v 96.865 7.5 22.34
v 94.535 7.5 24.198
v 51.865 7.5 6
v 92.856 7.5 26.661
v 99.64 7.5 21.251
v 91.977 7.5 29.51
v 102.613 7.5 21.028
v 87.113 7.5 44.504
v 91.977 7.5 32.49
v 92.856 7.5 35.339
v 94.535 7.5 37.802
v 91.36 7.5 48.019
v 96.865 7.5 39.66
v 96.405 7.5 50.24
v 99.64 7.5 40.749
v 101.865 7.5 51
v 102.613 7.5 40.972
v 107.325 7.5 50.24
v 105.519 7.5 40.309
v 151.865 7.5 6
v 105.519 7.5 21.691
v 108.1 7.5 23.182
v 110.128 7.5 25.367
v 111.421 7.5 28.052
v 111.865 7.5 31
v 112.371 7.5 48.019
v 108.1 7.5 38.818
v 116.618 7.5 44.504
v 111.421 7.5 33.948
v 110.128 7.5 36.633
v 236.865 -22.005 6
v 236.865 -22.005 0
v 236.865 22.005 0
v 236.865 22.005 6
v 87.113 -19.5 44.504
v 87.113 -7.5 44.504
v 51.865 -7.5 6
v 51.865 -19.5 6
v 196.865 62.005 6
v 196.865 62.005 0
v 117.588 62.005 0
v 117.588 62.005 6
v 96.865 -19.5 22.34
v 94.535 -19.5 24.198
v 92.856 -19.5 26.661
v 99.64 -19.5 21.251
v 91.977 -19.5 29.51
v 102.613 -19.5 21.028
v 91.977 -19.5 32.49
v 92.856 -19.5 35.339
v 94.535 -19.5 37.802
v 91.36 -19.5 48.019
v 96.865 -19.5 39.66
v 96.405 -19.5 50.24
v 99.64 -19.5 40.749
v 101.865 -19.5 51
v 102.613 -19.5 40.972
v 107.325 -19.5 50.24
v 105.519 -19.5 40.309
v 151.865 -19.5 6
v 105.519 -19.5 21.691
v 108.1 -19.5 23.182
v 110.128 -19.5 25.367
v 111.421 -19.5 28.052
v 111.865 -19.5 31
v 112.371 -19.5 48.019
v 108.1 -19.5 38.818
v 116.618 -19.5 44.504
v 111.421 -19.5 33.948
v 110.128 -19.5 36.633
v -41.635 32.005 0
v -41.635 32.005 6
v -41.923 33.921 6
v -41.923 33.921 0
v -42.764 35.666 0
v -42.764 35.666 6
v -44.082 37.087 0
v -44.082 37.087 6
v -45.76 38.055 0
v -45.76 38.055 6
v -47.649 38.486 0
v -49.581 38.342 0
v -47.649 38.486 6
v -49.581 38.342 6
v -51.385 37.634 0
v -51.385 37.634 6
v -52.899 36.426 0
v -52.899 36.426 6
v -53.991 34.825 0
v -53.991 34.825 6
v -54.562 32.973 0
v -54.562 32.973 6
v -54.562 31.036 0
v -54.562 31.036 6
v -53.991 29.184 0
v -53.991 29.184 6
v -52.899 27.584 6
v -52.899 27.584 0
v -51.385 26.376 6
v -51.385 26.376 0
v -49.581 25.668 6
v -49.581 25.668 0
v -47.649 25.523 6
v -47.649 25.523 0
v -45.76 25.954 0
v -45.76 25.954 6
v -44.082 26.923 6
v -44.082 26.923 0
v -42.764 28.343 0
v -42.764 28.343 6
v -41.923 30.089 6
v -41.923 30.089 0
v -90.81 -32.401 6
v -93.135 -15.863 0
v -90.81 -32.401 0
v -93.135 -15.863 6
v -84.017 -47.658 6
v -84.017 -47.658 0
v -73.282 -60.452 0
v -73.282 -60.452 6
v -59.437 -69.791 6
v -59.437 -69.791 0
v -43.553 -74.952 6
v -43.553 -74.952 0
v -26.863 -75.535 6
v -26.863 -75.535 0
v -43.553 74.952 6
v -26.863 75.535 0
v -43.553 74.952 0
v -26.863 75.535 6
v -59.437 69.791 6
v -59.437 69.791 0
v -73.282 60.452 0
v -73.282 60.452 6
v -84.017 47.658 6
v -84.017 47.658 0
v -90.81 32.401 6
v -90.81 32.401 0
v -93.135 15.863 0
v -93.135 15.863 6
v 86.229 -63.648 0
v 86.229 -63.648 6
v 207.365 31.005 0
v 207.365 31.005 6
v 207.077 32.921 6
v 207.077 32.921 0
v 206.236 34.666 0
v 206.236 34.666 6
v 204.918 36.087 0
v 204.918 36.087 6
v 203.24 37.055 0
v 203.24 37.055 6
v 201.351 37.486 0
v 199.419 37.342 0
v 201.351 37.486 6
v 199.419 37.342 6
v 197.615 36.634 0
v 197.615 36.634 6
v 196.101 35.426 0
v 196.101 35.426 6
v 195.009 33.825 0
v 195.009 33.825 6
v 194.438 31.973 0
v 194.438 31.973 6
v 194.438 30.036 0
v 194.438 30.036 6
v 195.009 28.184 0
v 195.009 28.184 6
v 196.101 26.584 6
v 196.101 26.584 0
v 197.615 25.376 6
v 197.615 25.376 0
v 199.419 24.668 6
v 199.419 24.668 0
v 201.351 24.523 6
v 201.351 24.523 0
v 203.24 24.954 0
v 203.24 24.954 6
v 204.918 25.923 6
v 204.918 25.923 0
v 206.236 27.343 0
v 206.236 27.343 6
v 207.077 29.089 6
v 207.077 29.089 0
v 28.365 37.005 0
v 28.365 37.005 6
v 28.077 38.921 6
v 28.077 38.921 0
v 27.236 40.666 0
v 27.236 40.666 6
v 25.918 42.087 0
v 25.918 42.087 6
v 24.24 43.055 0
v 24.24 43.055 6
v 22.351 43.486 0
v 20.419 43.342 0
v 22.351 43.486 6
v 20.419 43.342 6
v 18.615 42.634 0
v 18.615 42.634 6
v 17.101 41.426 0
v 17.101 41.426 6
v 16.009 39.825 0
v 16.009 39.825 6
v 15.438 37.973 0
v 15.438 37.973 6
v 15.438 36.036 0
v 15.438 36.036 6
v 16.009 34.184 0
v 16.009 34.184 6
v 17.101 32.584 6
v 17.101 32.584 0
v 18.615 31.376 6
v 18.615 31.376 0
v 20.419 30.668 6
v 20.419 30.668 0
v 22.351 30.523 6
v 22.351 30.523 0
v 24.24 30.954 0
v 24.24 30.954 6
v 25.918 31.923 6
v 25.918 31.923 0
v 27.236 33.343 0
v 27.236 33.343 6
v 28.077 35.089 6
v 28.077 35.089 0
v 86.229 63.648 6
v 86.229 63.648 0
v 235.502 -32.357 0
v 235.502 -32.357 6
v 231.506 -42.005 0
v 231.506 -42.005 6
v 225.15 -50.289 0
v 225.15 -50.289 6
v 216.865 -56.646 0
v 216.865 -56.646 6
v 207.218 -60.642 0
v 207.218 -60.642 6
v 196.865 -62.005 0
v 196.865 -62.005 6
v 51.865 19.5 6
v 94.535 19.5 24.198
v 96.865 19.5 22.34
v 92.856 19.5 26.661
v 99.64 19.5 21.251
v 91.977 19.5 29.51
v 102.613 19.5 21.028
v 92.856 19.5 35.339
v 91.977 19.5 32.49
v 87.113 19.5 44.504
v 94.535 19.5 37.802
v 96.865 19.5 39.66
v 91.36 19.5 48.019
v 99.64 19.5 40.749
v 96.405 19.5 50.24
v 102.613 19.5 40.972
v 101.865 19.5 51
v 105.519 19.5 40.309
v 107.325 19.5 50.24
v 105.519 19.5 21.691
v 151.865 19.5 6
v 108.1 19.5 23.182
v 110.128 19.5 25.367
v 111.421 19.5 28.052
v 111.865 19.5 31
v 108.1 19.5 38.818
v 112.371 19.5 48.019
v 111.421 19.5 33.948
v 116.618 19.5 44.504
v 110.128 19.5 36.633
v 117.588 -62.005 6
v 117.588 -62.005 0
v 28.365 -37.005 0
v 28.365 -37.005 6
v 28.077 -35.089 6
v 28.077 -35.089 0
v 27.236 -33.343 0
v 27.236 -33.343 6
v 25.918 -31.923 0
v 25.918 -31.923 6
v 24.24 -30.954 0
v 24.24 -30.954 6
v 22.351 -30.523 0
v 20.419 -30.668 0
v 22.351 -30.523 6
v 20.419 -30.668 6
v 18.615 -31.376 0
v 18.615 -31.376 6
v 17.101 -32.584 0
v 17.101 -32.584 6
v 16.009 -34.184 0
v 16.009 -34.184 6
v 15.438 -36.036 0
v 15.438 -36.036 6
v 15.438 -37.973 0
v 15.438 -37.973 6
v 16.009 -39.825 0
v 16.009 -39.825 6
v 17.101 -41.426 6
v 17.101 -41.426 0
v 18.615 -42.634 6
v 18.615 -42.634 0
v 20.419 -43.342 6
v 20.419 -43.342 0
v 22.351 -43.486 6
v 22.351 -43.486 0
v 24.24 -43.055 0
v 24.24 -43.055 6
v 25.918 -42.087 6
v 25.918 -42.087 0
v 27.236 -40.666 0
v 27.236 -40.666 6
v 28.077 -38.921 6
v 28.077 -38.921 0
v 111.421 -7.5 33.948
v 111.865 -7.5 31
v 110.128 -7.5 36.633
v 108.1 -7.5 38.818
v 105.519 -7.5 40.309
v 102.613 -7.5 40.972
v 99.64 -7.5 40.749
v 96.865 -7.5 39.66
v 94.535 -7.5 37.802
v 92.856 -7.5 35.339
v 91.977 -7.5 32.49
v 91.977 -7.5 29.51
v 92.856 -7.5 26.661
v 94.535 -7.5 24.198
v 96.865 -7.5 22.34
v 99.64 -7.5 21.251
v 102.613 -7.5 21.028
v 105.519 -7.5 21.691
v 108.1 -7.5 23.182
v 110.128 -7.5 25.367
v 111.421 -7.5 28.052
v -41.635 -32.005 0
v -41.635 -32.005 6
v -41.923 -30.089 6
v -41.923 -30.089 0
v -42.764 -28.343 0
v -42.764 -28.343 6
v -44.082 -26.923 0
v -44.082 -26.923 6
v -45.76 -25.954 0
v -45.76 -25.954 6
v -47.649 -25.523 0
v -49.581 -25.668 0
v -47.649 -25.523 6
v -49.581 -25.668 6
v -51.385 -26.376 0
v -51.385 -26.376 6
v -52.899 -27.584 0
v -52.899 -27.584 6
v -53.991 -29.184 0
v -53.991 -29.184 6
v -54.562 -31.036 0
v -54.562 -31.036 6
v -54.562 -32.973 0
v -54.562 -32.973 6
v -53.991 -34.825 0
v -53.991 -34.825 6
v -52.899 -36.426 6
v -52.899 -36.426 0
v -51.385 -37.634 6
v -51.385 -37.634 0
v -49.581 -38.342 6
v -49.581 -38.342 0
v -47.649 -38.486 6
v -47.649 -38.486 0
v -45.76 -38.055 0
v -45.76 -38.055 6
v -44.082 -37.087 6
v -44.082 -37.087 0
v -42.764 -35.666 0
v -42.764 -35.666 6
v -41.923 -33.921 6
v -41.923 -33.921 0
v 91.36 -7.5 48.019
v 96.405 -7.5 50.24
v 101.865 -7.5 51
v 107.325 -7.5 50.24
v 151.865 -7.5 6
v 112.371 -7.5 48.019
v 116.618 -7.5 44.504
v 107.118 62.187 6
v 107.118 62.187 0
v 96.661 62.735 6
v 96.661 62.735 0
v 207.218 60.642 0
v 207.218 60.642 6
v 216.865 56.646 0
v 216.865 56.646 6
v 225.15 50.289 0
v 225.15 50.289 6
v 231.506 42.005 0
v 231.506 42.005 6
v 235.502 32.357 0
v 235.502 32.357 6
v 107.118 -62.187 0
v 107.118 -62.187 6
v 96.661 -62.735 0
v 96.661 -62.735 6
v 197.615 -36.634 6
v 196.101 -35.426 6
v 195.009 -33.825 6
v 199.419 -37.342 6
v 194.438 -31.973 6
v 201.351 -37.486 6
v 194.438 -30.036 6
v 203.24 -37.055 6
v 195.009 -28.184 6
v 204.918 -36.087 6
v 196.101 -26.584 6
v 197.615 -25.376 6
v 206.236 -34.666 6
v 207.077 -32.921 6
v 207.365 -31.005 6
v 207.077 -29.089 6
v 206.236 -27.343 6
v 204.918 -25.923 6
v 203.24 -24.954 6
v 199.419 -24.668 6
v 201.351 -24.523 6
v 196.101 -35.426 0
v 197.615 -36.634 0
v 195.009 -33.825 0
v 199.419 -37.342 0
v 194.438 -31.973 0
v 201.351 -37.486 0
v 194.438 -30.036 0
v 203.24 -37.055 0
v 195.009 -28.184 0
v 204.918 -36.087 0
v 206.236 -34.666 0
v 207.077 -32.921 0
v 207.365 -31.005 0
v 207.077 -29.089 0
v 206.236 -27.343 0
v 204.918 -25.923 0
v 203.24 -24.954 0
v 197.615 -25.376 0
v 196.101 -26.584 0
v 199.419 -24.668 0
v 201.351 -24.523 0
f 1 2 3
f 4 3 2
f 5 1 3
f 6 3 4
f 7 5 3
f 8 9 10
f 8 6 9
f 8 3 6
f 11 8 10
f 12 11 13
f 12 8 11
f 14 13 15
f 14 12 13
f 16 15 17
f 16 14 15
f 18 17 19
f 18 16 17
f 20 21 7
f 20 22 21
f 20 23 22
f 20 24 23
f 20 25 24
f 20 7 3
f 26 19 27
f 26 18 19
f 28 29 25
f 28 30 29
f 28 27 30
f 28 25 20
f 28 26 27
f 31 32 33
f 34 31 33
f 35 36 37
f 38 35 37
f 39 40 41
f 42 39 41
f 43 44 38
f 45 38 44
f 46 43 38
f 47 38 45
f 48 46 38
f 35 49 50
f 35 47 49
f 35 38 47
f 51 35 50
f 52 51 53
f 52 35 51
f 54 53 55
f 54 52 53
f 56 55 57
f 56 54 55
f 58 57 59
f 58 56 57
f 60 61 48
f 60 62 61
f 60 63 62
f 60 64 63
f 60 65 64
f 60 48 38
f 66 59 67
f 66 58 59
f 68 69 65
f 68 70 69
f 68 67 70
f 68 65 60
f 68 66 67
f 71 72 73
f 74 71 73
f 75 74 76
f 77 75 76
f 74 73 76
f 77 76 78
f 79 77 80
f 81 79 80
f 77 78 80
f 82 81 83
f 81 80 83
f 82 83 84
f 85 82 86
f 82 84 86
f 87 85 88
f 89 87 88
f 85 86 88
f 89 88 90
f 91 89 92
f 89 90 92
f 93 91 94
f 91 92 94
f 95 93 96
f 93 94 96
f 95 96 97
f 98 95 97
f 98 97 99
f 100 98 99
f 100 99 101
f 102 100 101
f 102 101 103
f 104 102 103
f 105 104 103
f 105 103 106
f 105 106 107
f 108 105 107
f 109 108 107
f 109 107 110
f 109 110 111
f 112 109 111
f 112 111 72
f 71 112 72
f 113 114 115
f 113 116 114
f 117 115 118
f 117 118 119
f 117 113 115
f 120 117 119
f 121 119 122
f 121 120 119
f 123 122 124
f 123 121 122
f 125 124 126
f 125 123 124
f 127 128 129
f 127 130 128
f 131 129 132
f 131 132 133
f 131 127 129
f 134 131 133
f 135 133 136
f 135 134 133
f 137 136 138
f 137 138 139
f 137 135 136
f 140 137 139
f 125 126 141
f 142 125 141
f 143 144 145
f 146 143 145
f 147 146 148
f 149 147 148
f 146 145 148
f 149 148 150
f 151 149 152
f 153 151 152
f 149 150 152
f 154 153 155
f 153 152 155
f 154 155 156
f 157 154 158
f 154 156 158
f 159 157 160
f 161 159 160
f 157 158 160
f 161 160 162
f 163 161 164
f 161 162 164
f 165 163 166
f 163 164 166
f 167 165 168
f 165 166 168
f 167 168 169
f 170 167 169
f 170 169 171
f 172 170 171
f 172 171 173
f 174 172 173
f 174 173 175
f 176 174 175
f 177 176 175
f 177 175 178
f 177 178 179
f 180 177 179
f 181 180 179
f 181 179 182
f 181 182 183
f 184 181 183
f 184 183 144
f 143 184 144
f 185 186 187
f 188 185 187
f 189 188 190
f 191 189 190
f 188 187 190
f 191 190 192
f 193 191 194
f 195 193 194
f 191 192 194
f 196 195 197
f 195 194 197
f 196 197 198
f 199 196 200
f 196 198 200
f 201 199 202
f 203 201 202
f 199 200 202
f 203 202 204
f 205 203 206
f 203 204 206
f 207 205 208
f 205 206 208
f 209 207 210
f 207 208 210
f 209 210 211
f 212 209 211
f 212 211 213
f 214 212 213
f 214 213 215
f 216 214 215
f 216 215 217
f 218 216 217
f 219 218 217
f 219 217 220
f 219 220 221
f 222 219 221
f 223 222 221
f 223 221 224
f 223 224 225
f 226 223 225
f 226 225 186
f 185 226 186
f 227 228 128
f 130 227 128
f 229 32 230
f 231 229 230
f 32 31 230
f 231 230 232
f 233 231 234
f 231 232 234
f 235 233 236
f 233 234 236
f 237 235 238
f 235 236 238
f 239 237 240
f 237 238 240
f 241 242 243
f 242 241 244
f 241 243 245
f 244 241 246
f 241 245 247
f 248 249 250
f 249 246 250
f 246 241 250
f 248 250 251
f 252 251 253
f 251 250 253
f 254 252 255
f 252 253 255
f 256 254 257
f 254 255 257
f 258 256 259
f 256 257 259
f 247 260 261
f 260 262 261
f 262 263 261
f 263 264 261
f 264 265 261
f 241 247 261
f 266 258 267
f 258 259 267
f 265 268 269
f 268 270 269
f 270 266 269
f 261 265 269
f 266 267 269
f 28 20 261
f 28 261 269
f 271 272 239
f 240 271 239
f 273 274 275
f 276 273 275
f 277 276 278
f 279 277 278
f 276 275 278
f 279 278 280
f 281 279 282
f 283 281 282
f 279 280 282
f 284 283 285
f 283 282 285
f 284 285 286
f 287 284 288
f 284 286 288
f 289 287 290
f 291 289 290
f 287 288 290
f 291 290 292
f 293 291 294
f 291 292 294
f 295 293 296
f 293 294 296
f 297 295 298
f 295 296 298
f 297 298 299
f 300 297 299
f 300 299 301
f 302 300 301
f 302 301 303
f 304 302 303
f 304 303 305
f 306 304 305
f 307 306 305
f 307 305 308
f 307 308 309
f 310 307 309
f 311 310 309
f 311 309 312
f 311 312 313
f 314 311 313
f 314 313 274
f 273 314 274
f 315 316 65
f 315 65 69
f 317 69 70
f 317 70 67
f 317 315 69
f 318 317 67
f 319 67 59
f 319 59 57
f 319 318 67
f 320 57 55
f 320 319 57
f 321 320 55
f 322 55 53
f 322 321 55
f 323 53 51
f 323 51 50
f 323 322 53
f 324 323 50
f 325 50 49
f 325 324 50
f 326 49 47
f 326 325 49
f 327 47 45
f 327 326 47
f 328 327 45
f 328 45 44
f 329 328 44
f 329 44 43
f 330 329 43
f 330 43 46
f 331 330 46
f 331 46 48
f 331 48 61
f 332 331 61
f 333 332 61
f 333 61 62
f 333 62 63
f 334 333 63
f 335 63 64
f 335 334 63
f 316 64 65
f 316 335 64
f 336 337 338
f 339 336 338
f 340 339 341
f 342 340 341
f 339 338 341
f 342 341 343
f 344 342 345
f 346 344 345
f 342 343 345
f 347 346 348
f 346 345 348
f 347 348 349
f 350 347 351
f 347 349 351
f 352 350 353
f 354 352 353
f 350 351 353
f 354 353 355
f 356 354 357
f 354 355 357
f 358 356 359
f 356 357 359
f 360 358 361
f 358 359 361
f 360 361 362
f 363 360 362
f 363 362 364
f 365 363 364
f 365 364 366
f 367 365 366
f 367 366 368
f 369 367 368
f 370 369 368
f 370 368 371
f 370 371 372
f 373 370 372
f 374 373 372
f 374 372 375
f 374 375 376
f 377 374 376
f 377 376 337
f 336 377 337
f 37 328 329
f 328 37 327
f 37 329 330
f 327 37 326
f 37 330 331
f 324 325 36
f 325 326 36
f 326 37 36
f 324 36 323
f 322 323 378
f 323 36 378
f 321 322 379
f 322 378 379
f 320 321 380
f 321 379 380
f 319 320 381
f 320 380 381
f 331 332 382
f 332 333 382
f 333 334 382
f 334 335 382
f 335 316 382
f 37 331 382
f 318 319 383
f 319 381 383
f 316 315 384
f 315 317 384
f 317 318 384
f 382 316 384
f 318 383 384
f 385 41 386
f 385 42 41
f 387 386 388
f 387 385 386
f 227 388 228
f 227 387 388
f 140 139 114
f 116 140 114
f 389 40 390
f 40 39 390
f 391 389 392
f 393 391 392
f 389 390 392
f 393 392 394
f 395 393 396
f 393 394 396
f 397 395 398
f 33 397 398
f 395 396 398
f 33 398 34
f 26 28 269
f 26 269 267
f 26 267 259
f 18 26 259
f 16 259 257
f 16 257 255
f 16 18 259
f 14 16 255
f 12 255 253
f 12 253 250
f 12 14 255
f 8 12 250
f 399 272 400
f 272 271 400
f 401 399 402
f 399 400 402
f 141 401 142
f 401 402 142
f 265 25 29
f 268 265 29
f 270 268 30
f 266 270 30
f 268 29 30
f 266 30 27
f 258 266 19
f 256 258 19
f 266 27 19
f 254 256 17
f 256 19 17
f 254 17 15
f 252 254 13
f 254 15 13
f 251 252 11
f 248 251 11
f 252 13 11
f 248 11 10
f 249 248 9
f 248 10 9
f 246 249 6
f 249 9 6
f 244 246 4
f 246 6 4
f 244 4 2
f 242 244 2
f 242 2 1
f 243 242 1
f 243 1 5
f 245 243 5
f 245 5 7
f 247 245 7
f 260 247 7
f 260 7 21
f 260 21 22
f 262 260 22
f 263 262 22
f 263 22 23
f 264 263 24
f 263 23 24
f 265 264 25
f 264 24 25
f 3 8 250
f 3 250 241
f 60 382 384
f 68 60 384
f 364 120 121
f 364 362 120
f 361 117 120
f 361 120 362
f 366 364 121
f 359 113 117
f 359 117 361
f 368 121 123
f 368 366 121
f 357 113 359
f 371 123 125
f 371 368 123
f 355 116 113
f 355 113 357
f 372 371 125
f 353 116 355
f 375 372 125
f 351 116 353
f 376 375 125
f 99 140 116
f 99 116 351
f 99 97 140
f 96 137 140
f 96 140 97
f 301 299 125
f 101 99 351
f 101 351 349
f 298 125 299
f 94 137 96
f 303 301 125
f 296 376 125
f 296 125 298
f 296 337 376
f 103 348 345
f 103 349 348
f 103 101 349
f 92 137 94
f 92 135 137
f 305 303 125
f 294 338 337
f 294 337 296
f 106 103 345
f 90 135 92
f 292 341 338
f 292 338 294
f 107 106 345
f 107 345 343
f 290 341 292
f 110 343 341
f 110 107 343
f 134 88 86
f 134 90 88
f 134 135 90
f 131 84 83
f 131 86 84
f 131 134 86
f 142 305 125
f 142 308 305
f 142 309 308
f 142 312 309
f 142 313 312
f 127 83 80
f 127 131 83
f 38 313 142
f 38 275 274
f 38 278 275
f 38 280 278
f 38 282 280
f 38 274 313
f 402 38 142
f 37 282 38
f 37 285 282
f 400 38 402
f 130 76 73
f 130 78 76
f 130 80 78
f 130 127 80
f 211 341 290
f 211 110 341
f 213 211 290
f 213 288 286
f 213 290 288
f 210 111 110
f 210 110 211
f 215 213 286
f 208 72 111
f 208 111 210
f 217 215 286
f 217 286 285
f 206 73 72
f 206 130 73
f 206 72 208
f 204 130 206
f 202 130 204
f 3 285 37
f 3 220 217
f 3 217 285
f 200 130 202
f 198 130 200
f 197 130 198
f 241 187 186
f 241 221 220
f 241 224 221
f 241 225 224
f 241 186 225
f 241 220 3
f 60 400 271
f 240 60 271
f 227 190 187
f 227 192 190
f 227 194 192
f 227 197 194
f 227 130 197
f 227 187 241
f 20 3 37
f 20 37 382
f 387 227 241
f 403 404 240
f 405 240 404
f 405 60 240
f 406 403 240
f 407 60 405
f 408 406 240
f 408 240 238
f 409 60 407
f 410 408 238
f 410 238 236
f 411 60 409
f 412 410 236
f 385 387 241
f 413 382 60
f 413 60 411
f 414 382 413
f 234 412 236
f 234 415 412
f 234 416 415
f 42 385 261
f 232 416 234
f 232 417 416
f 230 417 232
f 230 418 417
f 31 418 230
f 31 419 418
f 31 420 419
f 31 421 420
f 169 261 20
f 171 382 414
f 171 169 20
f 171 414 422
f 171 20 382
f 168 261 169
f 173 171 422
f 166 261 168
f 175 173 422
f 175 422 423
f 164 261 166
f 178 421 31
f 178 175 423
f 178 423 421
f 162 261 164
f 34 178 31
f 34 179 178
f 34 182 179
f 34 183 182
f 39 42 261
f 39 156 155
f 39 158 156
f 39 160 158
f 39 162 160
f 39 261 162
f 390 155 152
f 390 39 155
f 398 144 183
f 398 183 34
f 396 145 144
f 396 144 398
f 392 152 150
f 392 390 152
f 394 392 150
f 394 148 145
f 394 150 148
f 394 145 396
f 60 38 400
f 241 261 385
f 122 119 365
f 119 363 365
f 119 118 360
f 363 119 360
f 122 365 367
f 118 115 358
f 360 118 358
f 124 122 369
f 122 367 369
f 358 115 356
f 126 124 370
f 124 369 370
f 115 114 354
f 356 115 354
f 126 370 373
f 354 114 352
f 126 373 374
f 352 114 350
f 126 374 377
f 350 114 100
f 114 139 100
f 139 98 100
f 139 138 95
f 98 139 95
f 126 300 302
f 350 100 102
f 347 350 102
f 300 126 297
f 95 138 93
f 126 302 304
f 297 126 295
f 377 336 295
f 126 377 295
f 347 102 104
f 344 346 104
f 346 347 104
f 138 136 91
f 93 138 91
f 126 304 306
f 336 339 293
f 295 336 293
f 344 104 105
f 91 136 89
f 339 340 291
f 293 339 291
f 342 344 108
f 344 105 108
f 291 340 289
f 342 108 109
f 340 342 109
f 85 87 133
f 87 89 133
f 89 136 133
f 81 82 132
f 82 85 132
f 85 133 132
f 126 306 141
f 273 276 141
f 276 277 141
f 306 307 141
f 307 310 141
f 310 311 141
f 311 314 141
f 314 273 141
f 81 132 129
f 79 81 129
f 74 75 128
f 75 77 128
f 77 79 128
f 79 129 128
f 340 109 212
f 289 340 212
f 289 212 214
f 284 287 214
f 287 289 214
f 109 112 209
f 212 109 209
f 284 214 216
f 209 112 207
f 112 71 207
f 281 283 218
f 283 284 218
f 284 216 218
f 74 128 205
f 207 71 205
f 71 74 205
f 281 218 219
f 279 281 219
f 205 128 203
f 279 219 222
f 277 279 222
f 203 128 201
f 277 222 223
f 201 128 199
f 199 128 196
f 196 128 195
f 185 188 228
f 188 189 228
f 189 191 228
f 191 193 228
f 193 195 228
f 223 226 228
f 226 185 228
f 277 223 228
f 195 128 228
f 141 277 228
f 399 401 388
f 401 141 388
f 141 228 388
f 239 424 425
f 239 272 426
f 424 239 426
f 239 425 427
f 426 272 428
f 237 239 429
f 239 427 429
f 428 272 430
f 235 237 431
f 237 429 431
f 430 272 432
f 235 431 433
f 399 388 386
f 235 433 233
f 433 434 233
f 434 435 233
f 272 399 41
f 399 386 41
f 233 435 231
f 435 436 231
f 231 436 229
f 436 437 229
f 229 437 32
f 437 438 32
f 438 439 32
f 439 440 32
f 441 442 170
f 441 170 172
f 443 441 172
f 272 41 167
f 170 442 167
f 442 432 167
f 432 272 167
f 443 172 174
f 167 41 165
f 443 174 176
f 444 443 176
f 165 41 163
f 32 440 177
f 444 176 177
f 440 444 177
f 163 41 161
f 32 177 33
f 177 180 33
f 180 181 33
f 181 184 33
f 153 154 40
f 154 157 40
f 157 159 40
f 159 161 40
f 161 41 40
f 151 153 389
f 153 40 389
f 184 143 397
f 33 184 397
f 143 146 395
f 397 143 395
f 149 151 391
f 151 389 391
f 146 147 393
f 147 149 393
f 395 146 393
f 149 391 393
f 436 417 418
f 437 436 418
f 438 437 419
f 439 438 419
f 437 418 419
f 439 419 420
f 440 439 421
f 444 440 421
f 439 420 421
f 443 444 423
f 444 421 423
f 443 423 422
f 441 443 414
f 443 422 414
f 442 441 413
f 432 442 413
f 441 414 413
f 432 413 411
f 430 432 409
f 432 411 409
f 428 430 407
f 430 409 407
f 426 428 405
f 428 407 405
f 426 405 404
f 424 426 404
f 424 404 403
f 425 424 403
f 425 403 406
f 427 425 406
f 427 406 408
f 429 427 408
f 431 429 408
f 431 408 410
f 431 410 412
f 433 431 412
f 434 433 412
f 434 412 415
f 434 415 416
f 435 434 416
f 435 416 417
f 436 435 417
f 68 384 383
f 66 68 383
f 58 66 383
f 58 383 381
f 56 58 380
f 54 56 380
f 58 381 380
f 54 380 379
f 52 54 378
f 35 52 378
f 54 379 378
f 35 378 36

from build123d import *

# Parameters (mm, degrees)
F1_DEPTH  = 6
F2_R      = 60
F3_R      = 40
F4_R      = 300
F8_R      = 10
F10_DEPTH = 12
F9_R      = 10
F11_DEPTH = 12
F12_R     = 6.5
F13_DEPTH = 25


with BuildPart() as f1:
    # F0 (on Top) → F1 (new body)
    with BuildSketch(Plane.XY):
        Polygon((101.865418, 62.004674), (-93.134582, 82.5), (-93.134582, -82.5), (101.865418, -62.004674), (236.865418, -62.004674), (236.865418, 62.004674), align=None)
    extrude(amount=F1_DEPTH)

    # F2
    f2_edges = [f1.edges().sort_by_distance(p)[0] for p in [
        (-93.134582, -82.5, 3),
        (-93.134582, 82.5, 3),
    ]]
    fillet(f2_edges, radius=F2_R)

    # F3
    f3_edges = [f1.edges().sort_by_distance(p)[0] for p in [
        (236.865418, -62.004674, 3),
        (236.865418, 62.004674, 3),
    ]]
    fillet(f3_edges, radius=F3_R)

    # F4
    f4_edges = [f1.edges().sort_by_distance(p)[0] for p in [
        (101.865418, -62.004674, 3),
        (101.865418, 62.004674, 3),
    ]]
    fillet(f4_edges, radius=F4_R)

    # F8 (on offset) → F10 (join)
    with BuildSketch(Plane.XZ.offset(-7.5)):
        with BuildLine():
            Line((151.865418, 6), (116.617663, 44.50449))
            ThreePointArc((116.617663, 44.50449), (101.865418, 51), (87.113173, 44.50449))
            Line((87.113173, 44.50449), (51.865418, 6))
            Line((51.865418, 6), (86.229213, 6))
            Line((86.229213, 6), (151.865418, 6))
        make_face()
        with Locations((101.865418, 31)):
            Circle(F8_R, mode=Mode.SUBTRACT)
    extrude(amount=-F10_DEPTH)

    # F9 (on offset) → F11 (join)
    with BuildSketch(Plane.XZ.offset(7.5)):
        with BuildLine():
            Line((151.865418, 6), (116.617663, 44.50449))
            ThreePointArc((116.617663, 44.50449), (101.865418, 51), (87.113173, 44.50449))
            Line((87.113173, 44.50449), (51.865418, 6))
            Line((51.865418, 6), (86.229213, 6))
            Line((86.229213, 6), (151.865418, 6))
        make_face()
        with Locations((101.865418, 31)):
            Circle(F9_R, mode=Mode.SUBTRACT)
    extrude(amount=F11_DEPTH)

    # F12 (on face) → F13 (cut)
    with BuildSketch(Plane.XY.offset(6)):
        with Locations((200.865418, 31.004674)):
            Circle(F12_R)
        with Locations((200.865418, -31.004674)):
            Circle(F12_R)
        with Locations((21.865418, 37.004674)):
            Circle(F12_R)
        with Locations((-48.134582, 32.004674)):
            Circle(F12_R)
        with Locations((-48.134582, -32.004674)):
            Circle(F12_R)
        with Locations((21.865418, -37.004674)):
            Circle(F12_R)
    extrude(amount=-F13_DEPTH, mode=Mode.SUBTRACT)


solid = f1.part
